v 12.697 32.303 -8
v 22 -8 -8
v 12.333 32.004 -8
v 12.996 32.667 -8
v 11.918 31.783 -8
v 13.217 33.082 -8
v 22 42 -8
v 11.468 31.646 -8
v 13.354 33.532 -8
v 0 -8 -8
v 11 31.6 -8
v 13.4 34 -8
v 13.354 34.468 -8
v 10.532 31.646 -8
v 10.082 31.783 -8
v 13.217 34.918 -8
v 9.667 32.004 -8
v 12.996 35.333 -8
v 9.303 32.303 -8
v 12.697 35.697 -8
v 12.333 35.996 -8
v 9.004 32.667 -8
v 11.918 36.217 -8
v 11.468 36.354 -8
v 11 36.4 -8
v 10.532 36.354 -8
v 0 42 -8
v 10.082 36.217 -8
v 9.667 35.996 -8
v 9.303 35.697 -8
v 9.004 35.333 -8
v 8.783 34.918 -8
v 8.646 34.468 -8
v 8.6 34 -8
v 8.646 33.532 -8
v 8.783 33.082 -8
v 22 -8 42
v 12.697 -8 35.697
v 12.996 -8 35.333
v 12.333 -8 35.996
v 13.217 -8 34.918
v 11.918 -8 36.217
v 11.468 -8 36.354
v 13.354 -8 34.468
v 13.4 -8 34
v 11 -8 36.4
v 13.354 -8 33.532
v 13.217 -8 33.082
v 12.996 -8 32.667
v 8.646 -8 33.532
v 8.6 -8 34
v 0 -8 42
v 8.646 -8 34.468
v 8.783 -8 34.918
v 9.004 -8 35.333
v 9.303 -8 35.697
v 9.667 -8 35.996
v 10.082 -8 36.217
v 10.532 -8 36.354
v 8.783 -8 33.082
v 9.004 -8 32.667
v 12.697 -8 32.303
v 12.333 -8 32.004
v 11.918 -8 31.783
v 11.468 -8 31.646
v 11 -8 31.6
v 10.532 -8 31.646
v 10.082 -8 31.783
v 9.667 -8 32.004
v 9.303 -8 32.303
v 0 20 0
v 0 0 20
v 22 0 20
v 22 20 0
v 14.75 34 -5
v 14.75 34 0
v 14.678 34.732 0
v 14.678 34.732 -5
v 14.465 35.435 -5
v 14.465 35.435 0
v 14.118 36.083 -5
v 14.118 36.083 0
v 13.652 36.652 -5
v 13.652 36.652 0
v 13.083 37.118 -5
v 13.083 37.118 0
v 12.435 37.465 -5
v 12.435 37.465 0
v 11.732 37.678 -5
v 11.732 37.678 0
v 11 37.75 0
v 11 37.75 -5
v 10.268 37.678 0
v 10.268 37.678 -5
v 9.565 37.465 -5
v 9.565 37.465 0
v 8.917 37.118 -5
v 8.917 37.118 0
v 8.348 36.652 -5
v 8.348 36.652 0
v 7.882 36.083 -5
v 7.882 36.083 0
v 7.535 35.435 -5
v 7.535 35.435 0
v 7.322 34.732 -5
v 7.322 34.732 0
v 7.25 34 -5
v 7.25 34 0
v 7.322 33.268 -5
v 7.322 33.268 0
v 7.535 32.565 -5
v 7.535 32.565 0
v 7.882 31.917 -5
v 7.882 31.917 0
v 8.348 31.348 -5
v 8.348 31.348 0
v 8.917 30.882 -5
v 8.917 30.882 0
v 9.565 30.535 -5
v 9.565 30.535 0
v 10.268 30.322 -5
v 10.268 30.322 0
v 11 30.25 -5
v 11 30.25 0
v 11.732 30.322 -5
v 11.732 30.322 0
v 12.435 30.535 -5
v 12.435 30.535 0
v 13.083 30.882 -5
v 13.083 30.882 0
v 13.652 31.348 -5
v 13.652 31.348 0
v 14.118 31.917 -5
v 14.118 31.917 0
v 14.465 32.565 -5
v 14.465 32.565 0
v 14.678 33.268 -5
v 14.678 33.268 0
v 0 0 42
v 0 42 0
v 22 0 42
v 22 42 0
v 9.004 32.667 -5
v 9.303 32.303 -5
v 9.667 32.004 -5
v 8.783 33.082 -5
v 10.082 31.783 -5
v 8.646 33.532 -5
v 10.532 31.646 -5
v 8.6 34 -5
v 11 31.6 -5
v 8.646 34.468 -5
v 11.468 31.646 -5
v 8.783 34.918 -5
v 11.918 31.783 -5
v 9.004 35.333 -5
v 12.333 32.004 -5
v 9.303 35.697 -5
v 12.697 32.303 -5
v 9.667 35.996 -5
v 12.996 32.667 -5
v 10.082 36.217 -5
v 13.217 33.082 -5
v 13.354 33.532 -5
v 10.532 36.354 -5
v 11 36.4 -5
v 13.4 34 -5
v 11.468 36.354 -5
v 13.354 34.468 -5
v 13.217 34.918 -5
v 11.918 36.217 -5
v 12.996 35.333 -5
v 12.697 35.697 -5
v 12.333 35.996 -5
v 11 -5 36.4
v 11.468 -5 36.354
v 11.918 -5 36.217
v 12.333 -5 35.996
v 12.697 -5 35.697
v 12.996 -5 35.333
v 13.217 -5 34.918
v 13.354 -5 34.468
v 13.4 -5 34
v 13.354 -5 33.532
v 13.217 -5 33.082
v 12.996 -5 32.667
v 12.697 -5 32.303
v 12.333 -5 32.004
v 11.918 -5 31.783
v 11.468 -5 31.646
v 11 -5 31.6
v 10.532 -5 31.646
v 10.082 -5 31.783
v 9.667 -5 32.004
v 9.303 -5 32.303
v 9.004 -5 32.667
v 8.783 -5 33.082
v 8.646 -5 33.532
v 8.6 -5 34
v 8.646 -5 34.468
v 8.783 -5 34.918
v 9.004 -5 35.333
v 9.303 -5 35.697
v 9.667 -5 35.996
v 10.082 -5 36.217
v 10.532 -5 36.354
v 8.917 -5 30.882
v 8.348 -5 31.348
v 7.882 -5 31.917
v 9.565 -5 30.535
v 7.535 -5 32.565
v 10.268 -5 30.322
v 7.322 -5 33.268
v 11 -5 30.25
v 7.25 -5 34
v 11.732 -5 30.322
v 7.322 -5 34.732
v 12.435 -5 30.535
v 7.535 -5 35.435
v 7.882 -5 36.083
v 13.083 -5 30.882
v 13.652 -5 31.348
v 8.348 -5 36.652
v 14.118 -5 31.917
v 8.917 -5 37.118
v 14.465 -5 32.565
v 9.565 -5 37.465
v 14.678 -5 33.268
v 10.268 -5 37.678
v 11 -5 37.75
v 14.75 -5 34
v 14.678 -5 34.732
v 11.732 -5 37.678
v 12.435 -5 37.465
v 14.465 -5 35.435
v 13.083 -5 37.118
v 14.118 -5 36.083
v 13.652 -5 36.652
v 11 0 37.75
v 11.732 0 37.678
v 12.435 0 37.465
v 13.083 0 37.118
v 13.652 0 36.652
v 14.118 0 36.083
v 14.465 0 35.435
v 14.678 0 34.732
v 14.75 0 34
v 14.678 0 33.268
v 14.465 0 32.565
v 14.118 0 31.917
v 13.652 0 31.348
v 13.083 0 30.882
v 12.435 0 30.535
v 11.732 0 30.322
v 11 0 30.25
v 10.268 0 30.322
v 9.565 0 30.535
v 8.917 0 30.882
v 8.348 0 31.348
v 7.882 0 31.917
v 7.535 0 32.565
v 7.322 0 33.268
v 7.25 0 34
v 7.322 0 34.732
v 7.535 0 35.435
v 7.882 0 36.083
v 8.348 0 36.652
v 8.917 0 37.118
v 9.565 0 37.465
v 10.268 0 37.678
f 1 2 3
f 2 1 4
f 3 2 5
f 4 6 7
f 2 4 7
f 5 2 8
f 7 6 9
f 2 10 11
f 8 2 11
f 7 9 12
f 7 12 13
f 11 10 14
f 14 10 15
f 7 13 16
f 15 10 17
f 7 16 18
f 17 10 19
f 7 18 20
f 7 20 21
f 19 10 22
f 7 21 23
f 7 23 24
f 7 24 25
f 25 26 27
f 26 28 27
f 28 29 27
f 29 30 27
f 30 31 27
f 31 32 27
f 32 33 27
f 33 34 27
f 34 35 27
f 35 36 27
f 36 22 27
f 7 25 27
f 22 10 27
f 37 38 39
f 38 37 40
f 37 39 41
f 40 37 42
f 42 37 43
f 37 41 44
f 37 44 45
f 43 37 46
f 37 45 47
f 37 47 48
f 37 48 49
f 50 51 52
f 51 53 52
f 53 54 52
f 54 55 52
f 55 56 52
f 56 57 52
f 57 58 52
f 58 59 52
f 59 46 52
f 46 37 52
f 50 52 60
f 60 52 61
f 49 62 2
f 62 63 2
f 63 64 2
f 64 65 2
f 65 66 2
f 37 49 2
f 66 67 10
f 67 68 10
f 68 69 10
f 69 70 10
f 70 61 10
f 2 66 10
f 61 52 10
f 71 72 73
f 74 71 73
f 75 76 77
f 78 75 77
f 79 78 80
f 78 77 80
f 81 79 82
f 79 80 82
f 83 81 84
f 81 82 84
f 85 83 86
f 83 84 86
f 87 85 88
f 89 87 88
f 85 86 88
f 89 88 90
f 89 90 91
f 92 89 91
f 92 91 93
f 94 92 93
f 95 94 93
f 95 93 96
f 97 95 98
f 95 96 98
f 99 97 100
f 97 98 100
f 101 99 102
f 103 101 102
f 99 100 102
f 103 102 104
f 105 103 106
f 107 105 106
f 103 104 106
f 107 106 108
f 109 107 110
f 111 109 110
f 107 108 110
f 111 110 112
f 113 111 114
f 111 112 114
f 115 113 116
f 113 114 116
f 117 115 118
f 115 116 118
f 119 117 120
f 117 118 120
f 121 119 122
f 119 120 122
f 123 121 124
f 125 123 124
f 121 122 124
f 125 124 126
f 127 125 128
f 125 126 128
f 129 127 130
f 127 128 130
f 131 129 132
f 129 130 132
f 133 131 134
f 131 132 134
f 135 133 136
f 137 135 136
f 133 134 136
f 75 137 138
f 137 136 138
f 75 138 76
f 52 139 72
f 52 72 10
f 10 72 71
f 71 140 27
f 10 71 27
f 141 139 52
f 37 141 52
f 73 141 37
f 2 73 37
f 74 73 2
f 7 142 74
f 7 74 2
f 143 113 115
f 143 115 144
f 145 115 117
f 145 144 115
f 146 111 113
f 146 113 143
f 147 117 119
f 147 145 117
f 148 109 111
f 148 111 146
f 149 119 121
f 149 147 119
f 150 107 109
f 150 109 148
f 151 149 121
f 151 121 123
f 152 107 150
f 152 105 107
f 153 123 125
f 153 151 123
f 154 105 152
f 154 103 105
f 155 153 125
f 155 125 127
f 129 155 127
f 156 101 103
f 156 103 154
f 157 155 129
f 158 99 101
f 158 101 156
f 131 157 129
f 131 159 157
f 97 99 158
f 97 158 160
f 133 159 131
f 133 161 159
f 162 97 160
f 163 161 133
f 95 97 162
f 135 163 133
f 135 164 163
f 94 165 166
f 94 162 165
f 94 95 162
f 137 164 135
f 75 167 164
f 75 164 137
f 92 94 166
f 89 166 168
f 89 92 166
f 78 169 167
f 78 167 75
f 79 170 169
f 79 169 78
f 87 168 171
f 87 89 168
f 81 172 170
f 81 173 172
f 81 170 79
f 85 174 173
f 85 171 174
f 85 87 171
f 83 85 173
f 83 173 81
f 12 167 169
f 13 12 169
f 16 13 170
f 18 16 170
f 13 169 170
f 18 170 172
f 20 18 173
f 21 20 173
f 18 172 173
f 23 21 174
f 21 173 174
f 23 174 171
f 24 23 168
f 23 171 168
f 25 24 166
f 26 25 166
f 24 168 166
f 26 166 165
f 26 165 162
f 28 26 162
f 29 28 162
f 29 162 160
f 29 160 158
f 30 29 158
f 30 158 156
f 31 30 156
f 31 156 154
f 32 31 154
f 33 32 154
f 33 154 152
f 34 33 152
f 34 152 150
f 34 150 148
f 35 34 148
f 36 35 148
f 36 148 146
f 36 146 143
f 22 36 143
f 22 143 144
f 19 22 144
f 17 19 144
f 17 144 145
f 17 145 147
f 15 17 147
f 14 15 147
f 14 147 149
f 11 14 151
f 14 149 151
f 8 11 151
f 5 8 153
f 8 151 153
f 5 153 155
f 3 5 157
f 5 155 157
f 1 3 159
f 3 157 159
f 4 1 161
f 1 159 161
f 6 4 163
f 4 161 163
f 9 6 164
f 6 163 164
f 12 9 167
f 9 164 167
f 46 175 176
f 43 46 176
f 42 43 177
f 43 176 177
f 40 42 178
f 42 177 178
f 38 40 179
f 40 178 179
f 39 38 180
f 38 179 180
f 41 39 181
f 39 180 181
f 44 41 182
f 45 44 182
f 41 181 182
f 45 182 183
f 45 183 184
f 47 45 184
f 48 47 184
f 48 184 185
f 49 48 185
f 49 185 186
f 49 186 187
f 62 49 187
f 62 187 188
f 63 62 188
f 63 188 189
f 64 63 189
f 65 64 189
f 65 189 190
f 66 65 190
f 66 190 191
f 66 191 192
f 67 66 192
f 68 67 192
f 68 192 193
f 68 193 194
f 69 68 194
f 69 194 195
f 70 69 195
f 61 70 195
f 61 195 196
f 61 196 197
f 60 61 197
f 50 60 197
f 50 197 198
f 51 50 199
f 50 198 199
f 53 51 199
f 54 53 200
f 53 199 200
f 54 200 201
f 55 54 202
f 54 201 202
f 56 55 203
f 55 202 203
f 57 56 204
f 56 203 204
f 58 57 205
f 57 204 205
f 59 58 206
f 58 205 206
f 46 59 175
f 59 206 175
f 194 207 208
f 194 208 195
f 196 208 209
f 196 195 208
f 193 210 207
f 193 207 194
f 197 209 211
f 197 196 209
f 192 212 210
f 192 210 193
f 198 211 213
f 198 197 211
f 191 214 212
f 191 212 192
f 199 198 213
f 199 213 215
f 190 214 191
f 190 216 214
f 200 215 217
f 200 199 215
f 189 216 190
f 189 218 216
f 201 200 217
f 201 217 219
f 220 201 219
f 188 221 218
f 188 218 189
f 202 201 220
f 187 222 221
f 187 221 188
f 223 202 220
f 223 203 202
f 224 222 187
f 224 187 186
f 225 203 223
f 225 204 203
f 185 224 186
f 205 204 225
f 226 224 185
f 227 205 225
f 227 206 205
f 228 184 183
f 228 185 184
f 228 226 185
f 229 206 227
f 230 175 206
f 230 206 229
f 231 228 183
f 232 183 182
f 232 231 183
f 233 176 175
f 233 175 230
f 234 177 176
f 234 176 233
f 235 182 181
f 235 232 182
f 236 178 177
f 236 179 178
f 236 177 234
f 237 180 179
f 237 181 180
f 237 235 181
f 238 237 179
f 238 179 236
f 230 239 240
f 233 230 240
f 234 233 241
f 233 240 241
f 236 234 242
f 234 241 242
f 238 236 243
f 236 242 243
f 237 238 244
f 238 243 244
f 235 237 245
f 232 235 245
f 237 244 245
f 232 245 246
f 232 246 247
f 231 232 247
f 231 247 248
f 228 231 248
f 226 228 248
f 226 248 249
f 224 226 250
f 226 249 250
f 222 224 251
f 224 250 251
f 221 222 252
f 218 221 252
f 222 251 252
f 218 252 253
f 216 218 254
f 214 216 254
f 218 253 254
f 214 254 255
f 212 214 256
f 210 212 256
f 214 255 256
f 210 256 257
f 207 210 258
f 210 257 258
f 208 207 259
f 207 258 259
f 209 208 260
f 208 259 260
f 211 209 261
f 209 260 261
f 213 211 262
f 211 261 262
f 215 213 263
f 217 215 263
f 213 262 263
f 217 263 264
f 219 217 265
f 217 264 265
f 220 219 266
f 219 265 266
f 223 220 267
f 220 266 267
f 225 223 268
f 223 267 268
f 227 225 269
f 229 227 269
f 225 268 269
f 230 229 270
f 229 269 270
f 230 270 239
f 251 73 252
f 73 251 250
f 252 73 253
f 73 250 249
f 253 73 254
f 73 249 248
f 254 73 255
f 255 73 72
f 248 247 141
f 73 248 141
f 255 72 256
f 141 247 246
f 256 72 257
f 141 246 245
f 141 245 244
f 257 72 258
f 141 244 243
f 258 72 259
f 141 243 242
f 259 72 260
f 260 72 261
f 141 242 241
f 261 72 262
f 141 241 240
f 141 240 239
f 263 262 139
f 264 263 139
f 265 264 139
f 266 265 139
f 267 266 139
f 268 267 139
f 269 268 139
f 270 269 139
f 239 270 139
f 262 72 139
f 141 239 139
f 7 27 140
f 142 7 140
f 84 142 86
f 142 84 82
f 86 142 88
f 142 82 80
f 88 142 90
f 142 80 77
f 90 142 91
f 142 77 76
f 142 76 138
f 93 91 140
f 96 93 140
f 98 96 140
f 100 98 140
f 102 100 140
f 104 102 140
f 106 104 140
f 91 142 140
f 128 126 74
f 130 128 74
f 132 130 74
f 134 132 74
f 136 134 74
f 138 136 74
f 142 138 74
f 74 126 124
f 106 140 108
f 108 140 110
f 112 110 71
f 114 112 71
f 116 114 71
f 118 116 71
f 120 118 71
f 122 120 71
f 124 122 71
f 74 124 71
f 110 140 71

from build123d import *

# Parameters (mm, degrees)
BOSS_EXTRUDE1_DEPTH = 22
SKETCH2_R           = 3.75
CUT_EXTRUDE1_DEPTH  = 5
SKETCH3_R           = 2.4
CUT_EXTRUDE2_DEPTH  = 5
SKETCH4_R           = 3.75
CUT_EXTRUDE3_DEPTH  = 5
SKETCH5_R           = 2.4
CUT_EXTRUDE4_DEPTH  = 5
CHAMFER1_SIZE       = 20


with BuildPart() as part:
    # Sketch1 → Boss-Extrude1 (new body)
    with BuildSketch(Plane(origin=(0, 0, 0), x_dir=(0, 0, -1), z_dir=(1, 0, 0))):
        Polygon((0, 0), (-42, 0), (-42, -8), (8, -8), (8, 42), (0, 42), align=None)
    extrude(amount=BOSS_EXTRUDE1_DEPTH)

    # Sketch2 → Cut-Extrude1 (cut)
    with BuildSketch(Plane.XY):
        with Locations((11, 34)):
            Circle(SKETCH2_R)
    extrude(amount=-CUT_EXTRUDE1_DEPTH, mode=Mode.SUBTRACT)

    # Sketch3 → Cut-Extrude2 (cut)
    with BuildSketch(Plane.XY.offset(-5)):
        with Locations((11, 34)):
            Circle(SKETCH3_R)
    extrude(amount=-CUT_EXTRUDE2_DEPTH, mode=Mode.SUBTRACT)

    # Sketch4 → Cut-Extrude3 (cut)
    with BuildSketch(Plane(origin=(0, 0, 0), x_dir=(1, 0, 0), z_dir=(0, 1, 0))):
        with Locations((11, -34)):
            Circle(SKETCH4_R)
    extrude(amount=-CUT_EXTRUDE3_DEPTH, mode=Mode.SUBTRACT)

    # Sketch5 → Cut-Extrude4 (cut)
    with BuildSketch(Plane(origin=(0, -5, 0), x_dir=(1, 0, 0), z_dir=(0, 1, 0))):
        with Locations((11, -34)):
            Circle(SKETCH5_R)
    extrude(amount=-CUT_EXTRUDE4_DEPTH, mode=Mode.SUBTRACT)

    # Chamfer1
    chamfer1_edges = [part.edges().sort_by_distance(p)[0] for p in [
        (11, 0, 0),
    ]]
    chamfer(chamfer1_edges, length=CHAMFER1_SIZE)


solid = part.part
